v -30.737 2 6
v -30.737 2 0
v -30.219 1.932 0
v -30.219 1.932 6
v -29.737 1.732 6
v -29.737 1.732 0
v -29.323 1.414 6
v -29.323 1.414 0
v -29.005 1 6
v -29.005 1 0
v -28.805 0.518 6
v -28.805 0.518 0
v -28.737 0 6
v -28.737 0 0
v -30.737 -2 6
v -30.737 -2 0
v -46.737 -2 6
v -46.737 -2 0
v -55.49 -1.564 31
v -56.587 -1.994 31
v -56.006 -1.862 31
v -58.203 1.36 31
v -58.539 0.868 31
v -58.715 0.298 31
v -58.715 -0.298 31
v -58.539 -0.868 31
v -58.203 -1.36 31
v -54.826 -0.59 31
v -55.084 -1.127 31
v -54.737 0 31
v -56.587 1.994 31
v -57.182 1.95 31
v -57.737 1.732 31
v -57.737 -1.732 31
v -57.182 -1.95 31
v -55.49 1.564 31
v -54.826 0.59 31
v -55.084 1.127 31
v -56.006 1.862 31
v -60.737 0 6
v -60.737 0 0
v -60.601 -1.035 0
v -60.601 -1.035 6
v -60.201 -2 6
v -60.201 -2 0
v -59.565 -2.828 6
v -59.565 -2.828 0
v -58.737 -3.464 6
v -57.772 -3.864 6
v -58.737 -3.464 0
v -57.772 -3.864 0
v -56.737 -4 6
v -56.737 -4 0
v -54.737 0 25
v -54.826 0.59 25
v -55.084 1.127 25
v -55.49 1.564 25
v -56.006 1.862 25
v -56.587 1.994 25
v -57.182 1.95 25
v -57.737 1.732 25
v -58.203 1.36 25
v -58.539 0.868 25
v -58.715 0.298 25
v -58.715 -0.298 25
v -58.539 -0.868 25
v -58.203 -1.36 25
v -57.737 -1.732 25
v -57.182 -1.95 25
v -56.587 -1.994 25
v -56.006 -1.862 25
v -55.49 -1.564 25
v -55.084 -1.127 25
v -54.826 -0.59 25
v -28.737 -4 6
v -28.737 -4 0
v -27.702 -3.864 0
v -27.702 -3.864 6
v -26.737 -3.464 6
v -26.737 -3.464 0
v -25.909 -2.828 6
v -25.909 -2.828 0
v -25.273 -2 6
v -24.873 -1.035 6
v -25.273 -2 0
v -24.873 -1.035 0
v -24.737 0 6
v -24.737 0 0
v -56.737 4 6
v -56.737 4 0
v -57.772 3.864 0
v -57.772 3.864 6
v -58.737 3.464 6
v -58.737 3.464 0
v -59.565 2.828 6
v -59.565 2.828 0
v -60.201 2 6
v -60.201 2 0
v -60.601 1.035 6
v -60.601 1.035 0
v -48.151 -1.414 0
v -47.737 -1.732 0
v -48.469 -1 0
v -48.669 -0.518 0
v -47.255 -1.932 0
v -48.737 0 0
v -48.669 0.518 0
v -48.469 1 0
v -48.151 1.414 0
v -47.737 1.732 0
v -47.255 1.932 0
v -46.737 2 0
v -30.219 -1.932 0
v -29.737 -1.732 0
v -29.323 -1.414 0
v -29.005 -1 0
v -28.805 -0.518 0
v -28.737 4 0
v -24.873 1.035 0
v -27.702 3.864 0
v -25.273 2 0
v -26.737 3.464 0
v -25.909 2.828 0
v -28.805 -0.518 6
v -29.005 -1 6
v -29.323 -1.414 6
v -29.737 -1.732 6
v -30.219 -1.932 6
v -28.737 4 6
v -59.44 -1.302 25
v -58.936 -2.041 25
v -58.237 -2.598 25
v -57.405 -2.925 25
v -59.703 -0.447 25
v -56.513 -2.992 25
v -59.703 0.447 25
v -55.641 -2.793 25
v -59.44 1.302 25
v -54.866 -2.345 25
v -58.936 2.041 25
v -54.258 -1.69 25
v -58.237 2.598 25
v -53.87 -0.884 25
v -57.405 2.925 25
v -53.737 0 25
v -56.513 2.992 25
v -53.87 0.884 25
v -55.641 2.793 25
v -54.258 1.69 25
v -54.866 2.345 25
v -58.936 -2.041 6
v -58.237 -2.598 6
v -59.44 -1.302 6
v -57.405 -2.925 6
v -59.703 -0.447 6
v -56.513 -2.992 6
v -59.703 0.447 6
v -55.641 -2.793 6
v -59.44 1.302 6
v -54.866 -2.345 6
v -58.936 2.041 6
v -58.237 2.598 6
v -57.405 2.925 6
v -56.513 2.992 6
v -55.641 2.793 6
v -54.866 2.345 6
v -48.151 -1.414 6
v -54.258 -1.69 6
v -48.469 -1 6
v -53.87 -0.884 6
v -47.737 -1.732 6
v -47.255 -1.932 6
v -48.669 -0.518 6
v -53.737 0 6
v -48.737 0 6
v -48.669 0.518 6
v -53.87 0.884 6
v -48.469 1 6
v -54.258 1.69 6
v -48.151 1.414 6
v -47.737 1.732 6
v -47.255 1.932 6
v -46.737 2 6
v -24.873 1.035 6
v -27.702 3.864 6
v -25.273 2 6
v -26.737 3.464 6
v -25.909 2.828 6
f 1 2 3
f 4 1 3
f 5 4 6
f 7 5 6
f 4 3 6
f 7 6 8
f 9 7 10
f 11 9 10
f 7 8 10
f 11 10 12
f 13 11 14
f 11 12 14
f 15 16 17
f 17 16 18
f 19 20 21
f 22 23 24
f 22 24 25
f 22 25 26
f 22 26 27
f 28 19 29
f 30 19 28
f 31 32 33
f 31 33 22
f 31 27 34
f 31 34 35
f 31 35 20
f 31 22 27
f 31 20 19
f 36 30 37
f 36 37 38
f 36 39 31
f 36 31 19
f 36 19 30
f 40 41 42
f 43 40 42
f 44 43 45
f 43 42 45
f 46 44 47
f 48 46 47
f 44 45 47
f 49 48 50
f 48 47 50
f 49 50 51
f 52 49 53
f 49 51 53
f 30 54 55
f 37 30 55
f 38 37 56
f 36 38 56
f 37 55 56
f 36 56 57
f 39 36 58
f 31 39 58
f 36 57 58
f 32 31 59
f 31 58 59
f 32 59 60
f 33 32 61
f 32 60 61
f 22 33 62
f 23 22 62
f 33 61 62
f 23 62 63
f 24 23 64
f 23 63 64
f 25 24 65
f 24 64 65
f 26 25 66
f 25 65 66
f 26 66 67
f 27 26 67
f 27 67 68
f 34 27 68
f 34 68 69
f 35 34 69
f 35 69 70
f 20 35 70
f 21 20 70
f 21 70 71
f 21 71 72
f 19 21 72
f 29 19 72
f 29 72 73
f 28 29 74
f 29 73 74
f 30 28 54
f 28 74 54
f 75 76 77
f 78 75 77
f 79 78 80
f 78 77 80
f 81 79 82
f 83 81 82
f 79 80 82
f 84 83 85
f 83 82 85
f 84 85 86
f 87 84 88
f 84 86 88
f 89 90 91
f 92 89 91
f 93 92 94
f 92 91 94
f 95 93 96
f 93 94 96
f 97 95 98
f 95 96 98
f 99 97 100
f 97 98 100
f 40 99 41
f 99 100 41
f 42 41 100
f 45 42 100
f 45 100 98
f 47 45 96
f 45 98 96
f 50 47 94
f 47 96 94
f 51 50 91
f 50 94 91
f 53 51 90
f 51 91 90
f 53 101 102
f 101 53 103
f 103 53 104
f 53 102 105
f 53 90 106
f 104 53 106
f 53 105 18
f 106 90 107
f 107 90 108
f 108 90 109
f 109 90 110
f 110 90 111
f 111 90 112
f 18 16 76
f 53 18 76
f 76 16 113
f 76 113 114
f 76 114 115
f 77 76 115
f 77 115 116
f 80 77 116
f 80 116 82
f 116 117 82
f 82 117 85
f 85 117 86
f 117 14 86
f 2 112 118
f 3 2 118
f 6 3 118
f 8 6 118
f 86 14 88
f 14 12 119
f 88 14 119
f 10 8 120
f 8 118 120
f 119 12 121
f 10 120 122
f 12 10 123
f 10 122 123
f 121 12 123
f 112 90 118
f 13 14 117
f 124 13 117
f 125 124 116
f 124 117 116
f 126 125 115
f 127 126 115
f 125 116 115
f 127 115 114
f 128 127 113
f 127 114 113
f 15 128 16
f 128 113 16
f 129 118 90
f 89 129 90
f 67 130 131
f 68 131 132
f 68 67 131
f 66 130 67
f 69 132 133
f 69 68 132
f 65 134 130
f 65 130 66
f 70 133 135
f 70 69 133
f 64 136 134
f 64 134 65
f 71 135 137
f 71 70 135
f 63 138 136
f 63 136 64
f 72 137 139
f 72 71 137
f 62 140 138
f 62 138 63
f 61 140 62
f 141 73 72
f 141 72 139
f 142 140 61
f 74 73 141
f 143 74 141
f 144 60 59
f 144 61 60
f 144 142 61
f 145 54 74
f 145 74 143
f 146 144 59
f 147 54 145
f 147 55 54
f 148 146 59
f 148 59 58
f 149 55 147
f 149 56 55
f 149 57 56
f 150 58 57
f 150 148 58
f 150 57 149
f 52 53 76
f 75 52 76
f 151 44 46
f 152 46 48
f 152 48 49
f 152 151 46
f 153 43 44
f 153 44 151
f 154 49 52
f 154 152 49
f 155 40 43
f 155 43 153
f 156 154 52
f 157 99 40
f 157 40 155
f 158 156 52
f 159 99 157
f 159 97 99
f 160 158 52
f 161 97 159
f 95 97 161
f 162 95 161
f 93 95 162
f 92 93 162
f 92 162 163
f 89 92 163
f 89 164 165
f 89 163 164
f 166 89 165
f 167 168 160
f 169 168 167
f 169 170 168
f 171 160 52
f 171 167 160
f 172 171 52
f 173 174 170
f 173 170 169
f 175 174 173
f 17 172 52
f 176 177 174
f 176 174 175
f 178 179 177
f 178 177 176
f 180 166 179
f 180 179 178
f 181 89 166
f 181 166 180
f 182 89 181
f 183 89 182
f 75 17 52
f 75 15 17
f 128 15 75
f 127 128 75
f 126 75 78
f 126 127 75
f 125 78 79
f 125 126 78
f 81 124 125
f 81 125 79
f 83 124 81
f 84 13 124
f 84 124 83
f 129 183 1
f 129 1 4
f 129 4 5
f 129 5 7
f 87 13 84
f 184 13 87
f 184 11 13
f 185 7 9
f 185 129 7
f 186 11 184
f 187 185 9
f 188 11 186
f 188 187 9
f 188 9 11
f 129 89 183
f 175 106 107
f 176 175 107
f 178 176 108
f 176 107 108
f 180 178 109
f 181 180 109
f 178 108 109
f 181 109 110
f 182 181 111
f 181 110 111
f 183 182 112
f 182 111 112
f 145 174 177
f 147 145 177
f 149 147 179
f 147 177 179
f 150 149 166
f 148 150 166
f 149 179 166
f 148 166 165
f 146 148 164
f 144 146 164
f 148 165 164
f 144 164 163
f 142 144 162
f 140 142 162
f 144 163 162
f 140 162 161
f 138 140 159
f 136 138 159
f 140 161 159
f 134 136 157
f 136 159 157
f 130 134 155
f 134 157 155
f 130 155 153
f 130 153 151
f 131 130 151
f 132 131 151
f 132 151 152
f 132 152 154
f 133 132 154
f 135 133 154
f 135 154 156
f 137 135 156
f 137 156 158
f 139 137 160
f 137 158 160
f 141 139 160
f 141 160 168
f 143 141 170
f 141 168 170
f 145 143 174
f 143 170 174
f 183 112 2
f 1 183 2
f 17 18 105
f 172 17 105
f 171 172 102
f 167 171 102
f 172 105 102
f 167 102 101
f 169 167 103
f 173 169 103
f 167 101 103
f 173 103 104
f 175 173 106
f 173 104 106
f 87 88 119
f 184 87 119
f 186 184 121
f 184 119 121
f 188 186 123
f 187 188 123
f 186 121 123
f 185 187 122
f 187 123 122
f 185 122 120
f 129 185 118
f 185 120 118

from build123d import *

# Parameters (mm, degrees)
F1_DEPTH = 6
F2_R     = 3
F3_DEPTH = 19
F4_R     = 2
F5_DEPTH = 6


with BuildPart() as f1:
    # F0 (on Top) → F1 (new body)
    with BuildSketch(Plane.XY):
        with BuildLine():
            Line((-28.736944, 4), (-56.736944, 4))
            ThreePointArc((-56.736944, 4), (-59.565371, 2.828427), (-60.736944, 0))
            ThreePointArc((-60.736944, 0), (-59.565371, -2.828427), (-56.736944, -4))
            Line((-56.736944, -4), (-28.736944, -4))
            ThreePointArc((-28.736944, -4), (-25.908517, -2.828427), (-24.736944, 0))
            ThreePointArc((-24.736944, 0), (-25.908517, 2.828427), (-28.736944, 4))
        make_face()
        with BuildLine():
            ThreePointArc((-48.736944, 0), (-48.151158, 1.414214), (-46.736944, 2))
            Line((-46.736944, 2), (-30.736944, 2))
            ThreePointArc((-30.736944, 2), (-29.32273, 1.414214), (-28.736944, 0))
            ThreePointArc((-28.736944, 0), (-29.32273, -1.414214), (-30.736944, -2))
            Line((-30.736944, -2), (-46.736944, -2))
            ThreePointArc((-46.736944, -2), (-48.151158, -1.414214), (-48.736944, 0))
        make_face(mode=Mode.SUBTRACT)
    extrude(amount=F1_DEPTH)

    # F2 (on face) → F3 (join)
    with BuildSketch(Plane.XY.offset(6)):
        with Locations((-56.736944, 0)):
            Circle(F2_R)
    extrude(amount=F3_DEPTH)

    # F4 (on face) → F5 (join)
    with BuildSketch(Plane.XY.offset(25)):
        with Locations((-56.736944, 0)):
            Circle(F4_R)
    extrude(amount=F5_DEPTH)


solid = f1.part
